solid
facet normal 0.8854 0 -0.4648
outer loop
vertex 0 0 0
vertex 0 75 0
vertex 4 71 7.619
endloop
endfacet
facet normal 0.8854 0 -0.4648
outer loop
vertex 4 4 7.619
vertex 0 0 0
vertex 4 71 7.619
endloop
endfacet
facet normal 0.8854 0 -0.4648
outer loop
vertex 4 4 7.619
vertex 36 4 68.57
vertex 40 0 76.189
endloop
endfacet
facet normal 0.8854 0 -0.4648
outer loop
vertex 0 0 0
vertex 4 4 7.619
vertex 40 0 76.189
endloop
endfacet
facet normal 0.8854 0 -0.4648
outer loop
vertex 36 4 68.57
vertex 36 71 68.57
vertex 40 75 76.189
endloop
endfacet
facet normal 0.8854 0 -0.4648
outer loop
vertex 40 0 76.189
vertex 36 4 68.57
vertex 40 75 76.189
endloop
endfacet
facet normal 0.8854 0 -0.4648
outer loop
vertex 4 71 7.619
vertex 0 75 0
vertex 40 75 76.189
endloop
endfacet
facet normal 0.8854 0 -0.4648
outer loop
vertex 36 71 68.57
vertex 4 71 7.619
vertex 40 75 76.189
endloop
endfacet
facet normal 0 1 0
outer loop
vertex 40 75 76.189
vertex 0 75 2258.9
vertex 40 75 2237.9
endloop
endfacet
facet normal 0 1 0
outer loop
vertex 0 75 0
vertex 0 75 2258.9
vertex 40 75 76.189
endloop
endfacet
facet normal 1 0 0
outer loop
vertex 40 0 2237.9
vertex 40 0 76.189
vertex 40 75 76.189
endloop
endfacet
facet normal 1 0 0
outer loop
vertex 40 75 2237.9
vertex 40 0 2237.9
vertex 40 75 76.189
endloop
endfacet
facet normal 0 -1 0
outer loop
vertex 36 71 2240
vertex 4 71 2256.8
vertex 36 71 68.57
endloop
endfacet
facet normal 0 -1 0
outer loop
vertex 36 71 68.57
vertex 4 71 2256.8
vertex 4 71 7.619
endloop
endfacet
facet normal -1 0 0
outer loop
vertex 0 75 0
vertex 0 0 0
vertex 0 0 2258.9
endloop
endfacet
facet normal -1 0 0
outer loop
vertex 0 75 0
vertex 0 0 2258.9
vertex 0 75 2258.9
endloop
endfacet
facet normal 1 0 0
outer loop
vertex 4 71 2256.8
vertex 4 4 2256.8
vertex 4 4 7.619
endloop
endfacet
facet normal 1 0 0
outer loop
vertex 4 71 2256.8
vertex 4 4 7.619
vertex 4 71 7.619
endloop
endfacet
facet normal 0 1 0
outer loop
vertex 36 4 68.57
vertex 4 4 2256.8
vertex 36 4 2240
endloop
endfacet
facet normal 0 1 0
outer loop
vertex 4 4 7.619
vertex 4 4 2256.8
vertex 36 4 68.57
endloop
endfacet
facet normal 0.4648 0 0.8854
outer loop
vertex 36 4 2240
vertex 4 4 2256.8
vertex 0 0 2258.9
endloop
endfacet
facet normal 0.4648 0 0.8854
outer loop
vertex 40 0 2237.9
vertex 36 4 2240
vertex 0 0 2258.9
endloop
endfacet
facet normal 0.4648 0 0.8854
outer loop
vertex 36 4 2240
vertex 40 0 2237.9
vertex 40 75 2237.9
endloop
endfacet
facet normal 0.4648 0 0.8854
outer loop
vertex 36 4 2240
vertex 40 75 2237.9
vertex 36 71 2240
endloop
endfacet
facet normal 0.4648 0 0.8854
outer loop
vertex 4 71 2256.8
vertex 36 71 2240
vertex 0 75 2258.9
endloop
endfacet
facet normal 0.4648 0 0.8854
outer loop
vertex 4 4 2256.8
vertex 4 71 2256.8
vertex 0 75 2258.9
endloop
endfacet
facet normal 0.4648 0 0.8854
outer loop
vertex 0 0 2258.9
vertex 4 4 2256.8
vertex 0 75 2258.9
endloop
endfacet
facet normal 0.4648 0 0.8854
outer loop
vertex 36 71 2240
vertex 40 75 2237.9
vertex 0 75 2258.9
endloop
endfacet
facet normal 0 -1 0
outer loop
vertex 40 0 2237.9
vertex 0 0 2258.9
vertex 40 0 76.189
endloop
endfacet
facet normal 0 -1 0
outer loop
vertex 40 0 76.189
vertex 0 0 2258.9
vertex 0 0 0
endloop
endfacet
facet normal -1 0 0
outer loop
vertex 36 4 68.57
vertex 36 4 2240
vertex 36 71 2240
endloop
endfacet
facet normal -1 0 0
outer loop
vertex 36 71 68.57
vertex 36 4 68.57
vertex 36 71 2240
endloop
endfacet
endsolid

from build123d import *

# Parameters (mm, degrees)
F0_W     = 40
F0_H     = 75
F0_W_2   = 32
F0_H_2   = 67
F1_DEPTH = 2258.9
F3_DEPTH = 75
F5_DEPTH = 75


with BuildPart() as f1:
    # F0 (on Top) → F1 (new body)
    with BuildSketch(Plane.XY):
        with Locations((20, 37.5)):
            Rectangle(F0_W, F0_H)
        with Locations((20, 37.5)):
            Rectangle(F0_W_2, F0_H_2, mode=Mode.SUBTRACT)
    extrude(amount=F1_DEPTH)

    # F2 (on face) → F3 (cut, through all)
    with BuildSketch(Plane(origin=(0, 75, 0), x_dir=(-1, 0, 0), z_dir=(0, 1, 0))):
        Polygon((-40, 2237.899531), (0, 2258.9), (-40, 2258.9), align=None)
    extrude(amount=-F3_DEPTH, mode=Mode.SUBTRACT)

    # F4 (on face) → F5 (cut, through all)
    with BuildSketch(Plane(origin=(0, 75, 0), x_dir=(-1, 0, 0), z_dir=(0, 1, 0))):
        Polygon((-40, 0), (0, 0), (-40, 76.188773), align=None)
    extrude(amount=-F5_DEPTH, mode=Mode.SUBTRACT)


solid = f1.part
